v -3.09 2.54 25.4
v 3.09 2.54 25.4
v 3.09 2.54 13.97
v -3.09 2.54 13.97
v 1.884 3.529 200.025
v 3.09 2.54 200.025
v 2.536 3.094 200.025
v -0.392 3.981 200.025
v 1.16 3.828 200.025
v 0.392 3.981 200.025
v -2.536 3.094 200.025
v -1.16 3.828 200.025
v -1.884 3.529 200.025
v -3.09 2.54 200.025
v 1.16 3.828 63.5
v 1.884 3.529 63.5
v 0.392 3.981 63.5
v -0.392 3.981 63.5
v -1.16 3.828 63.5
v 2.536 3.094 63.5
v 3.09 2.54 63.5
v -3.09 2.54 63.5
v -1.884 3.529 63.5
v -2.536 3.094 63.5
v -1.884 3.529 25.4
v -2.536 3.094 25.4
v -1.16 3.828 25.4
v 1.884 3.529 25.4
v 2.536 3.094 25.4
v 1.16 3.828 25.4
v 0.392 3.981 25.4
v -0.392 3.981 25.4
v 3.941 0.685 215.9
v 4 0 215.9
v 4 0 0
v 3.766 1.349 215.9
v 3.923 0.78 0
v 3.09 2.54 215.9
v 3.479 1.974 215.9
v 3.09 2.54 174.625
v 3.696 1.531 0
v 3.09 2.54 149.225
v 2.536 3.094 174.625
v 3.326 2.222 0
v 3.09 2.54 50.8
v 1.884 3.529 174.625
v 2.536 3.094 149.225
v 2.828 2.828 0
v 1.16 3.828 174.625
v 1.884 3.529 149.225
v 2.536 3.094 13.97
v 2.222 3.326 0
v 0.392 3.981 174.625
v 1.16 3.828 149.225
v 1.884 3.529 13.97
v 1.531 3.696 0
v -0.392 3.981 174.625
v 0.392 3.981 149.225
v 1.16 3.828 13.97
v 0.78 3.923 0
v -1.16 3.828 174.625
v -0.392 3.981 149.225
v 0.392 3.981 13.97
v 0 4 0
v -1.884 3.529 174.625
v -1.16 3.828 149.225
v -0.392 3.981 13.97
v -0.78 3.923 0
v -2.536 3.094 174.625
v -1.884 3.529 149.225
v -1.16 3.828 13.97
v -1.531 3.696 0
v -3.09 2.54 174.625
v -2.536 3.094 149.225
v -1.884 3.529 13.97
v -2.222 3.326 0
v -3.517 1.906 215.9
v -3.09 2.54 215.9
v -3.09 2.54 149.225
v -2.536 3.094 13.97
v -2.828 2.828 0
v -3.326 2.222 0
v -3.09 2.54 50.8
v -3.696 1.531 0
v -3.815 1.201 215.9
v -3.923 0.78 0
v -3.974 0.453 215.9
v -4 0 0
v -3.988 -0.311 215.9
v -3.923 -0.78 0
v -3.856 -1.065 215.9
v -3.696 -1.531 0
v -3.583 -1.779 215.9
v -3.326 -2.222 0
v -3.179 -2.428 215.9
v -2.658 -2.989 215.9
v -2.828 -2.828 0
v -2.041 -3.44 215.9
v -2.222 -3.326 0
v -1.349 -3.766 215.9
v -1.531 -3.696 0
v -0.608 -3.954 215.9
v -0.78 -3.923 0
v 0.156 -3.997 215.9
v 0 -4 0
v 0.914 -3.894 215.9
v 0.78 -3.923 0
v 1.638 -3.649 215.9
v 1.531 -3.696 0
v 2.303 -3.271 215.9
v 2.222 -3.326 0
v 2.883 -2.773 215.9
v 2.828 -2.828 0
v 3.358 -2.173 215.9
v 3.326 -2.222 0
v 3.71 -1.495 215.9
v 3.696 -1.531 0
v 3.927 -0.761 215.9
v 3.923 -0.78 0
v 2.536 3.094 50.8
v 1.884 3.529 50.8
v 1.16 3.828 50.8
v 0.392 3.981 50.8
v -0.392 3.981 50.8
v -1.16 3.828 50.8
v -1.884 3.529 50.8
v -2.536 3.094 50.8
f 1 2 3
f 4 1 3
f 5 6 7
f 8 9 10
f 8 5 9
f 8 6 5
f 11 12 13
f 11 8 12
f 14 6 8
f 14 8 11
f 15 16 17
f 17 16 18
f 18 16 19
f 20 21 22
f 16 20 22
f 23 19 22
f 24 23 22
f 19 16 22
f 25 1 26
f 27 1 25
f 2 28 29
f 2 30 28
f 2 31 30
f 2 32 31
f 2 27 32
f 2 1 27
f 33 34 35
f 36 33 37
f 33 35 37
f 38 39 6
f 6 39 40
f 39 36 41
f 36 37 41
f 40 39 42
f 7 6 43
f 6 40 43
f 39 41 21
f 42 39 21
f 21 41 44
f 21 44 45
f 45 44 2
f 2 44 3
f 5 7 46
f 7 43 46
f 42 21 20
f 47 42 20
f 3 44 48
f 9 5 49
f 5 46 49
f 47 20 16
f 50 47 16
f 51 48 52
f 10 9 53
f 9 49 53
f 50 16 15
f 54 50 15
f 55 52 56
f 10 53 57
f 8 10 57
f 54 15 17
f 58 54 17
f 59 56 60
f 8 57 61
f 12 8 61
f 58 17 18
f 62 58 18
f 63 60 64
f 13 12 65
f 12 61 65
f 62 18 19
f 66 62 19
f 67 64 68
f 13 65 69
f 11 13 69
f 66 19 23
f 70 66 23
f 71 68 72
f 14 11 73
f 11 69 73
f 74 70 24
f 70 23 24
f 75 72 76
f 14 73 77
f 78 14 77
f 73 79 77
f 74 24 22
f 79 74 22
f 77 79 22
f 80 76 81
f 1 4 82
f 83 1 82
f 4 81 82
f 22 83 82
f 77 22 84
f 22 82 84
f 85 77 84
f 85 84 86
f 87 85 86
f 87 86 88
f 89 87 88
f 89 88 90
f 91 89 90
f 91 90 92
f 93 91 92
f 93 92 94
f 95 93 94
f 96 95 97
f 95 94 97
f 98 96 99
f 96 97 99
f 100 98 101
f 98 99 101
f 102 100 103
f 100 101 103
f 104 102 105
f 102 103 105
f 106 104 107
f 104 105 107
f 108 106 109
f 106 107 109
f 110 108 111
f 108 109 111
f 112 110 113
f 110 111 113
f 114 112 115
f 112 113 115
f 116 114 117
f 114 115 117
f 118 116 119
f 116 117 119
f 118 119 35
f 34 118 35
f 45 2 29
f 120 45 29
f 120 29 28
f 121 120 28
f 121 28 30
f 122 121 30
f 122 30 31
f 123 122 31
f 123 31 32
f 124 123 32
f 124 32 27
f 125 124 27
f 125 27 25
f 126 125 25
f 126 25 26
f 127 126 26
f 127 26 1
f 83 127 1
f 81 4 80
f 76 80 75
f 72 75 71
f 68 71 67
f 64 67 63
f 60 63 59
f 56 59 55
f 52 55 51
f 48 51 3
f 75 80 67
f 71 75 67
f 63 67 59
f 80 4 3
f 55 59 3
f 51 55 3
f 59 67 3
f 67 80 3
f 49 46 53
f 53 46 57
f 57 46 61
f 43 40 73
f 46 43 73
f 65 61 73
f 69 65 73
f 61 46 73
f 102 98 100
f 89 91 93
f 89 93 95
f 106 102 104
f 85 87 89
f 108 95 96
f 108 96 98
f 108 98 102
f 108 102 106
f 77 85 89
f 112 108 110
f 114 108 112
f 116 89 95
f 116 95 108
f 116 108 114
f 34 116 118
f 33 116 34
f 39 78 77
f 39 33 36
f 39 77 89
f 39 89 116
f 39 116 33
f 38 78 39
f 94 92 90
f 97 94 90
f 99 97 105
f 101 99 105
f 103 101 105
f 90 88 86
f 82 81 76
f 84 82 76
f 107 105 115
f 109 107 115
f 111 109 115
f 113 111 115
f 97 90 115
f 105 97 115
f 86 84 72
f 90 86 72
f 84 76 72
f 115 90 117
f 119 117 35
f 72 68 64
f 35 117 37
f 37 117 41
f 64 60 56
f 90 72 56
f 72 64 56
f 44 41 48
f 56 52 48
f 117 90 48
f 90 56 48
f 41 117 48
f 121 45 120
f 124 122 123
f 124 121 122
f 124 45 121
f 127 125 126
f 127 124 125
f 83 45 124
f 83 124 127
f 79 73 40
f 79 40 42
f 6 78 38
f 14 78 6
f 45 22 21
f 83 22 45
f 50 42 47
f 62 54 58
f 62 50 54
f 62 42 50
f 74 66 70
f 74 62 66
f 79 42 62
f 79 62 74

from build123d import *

# Parameters (mm, degrees)
SKETCH1_R           = 4
BOSS_EXTRUDE1_DEPTH = 215.9
SKETCH2_W           = 12.7
SKETCH2_H           = 1.46
SKETCH2_W_2         = 25.4
SKETCH2_W_3         = 15.875
SKETCH2_W_4         = 11.43
CUT_EXTRUDE1_DEPTH  = 6.35


with BuildPart() as part:
    # Sketch1 → Boss-Extrude1 (new body)
    with BuildSketch(Plane.XY):
        Circle(SKETCH1_R)
    extrude(amount=BOSS_EXTRUDE1_DEPTH)

    # Sketch2 → Cut-Extrude1 (cut, symmetric)
    with BuildSketch(Plane(origin=(0, 0, 0), x_dir=(0, 0, -1), z_dir=(1, 0, 0))):
        with Locations((-57.15, 3.27)):
            Rectangle(SKETCH2_W, SKETCH2_H)
        with Locations((-161.925, 3.27)):
            Rectangle(SKETCH2_W_2, SKETCH2_H)
        with Locations((-207.9625, 3.27)):
            Rectangle(SKETCH2_W_3, SKETCH2_H)
        with Locations((-19.685, 3.27)):
            Rectangle(SKETCH2_W_4, SKETCH2_H)
    extrude(amount=CUT_EXTRUDE1_DEPTH, both=True, mode=Mode.SUBTRACT)


solid = part.part
